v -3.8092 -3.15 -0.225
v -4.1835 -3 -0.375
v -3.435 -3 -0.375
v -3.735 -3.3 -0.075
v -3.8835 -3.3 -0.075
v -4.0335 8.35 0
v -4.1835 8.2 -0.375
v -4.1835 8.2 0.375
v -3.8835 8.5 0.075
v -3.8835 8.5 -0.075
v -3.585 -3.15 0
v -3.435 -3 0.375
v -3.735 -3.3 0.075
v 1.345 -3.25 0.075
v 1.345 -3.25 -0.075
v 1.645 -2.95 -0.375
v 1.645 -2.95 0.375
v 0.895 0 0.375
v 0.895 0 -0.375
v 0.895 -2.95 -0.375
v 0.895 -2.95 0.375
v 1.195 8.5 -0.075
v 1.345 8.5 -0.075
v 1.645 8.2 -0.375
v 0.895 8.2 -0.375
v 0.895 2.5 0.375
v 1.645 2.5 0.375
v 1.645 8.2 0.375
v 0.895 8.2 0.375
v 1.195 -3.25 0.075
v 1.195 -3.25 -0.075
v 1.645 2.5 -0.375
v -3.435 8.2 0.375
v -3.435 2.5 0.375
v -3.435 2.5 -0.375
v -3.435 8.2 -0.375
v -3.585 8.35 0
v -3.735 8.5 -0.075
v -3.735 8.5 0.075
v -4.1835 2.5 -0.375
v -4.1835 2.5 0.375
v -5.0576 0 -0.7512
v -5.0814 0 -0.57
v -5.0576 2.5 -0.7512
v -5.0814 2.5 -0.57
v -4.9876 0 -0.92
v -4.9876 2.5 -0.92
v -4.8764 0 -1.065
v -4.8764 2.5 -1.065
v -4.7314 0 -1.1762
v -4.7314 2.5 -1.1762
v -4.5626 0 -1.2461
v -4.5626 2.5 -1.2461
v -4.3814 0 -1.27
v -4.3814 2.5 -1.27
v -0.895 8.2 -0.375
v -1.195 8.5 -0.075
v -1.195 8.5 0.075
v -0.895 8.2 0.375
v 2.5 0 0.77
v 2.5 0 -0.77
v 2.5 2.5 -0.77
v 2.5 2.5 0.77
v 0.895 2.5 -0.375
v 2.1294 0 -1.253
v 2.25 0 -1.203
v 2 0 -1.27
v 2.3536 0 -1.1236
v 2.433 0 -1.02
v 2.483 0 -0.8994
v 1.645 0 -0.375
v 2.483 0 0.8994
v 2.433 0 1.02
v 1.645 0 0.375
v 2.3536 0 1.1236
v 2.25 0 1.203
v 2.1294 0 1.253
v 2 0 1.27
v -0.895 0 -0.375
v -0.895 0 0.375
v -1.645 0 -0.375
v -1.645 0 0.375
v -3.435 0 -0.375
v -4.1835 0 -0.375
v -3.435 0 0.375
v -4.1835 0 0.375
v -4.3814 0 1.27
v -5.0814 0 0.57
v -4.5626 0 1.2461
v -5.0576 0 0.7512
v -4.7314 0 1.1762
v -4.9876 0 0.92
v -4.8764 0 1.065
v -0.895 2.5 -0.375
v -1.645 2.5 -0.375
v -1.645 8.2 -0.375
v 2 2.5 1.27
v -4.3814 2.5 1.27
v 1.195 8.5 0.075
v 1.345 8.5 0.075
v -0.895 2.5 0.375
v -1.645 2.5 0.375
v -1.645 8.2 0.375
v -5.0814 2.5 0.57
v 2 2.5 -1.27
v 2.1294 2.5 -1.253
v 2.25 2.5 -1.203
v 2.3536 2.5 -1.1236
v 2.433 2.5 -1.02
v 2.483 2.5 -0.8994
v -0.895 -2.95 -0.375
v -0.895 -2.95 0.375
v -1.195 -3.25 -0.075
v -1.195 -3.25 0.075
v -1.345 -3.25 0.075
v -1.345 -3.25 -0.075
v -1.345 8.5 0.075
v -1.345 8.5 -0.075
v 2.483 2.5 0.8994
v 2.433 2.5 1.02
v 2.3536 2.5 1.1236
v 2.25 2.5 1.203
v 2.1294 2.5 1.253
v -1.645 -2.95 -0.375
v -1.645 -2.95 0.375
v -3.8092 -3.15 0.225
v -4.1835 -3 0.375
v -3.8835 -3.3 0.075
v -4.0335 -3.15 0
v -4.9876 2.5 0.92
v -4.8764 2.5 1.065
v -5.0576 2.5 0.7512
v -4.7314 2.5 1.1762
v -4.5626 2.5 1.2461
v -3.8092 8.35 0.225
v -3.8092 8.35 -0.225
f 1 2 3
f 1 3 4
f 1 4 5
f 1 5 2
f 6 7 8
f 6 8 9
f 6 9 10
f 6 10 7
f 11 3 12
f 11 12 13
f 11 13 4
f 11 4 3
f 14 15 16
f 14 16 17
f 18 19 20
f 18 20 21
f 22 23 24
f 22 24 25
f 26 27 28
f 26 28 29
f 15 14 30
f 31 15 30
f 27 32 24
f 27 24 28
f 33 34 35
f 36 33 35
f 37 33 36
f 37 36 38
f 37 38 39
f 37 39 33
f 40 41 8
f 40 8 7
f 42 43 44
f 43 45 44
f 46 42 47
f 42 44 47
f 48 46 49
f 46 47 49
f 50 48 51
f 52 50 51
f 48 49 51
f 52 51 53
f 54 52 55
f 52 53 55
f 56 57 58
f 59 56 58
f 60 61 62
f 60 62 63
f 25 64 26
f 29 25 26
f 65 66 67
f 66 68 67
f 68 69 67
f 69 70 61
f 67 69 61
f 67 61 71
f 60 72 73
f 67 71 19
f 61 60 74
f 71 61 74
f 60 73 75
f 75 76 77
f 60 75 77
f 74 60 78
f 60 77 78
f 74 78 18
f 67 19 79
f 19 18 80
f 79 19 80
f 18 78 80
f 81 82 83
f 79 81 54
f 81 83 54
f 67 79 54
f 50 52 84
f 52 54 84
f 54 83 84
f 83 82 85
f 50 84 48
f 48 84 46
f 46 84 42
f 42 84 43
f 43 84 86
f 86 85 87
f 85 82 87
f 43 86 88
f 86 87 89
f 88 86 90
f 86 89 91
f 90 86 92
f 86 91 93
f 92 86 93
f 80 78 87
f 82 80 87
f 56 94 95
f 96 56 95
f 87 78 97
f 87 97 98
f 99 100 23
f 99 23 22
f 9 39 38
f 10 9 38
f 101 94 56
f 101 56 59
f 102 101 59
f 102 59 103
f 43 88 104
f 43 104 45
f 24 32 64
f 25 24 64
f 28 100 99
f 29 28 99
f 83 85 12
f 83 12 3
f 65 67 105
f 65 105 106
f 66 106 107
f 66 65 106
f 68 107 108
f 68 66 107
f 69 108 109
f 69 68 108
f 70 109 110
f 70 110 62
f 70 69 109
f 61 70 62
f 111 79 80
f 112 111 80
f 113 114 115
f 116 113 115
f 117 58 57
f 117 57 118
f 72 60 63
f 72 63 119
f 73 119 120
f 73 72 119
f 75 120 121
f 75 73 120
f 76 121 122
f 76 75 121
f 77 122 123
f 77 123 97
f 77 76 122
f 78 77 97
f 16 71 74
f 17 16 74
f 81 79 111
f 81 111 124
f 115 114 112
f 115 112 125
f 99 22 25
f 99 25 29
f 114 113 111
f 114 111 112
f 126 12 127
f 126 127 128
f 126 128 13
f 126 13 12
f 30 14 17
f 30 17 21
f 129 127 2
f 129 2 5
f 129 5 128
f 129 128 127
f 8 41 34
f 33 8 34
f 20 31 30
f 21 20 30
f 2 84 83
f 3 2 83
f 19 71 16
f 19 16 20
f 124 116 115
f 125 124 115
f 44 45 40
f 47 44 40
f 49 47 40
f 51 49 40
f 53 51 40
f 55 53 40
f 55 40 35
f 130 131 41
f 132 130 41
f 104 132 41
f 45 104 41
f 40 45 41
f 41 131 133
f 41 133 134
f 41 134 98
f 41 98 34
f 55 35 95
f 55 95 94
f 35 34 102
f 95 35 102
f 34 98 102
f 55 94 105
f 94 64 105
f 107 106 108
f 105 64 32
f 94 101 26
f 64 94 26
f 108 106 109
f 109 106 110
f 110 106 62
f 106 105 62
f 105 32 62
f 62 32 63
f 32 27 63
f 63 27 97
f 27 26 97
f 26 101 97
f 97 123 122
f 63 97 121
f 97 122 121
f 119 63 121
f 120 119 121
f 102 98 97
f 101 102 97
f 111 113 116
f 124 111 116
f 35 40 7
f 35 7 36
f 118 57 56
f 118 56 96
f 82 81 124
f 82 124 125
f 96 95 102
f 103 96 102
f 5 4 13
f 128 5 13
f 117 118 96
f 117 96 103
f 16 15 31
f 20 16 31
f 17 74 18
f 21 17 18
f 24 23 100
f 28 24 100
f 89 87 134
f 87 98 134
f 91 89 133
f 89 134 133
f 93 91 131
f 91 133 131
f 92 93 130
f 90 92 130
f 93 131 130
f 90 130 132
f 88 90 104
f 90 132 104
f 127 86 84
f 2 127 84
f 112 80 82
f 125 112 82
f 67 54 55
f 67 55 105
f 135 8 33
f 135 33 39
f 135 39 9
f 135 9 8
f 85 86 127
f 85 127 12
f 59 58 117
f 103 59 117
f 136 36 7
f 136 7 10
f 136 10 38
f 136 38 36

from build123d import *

# Parameters (mm, degrees)
BOSS_EXTRUDE1_DEPTH          = 2.5
SKETCH2_W                    = 0.75
SKETCH2_H                    = 0.75
BOSS_EXTRUDE2_DEPTH          = 8.5
BOSS_EXTRUDE2_DEPTH_BACK     = 3.25
CHAMFER1_SIZE                = 0.3
REDONDEO3_R                  = 0.7
CROQUIS5_W                   = 0.748499393
CROQUIS5_H                   = 0.75
SALIENTE_EXTRUIR4_DEPTH      = 5.7
SALIENTE_EXTRUIR4_DEPTH_BACK = 5.5
CROQUIS6_W                   = 0.748499393
CROQUIS6_H                   = 0.75
SALIENTE_EXTRUIR5_DEPTH      = 0.3
SALIENTE_EXTRUIR5_TAPER      = 45
CROQUIS7_W                   = 0.748499393
CROQUIS7_H                   = 0.75
SALIENTE_EXTRUIR6_DEPTH      = 0.3
SALIENTE_EXTRUIR6_TAPER      = 45


with BuildPart() as part:
    # Sketch1 → Boss-Extrude1 (new body)
    with BuildSketch(Plane(origin=(0, 0, 0), x_dir=(-1, 0, 0), z_dir=(0, 1, 0))):
        with BuildLine():
            Line((-2, 1.27), (2, 1.27))
            Line((2, 1.27), (4.545175415, 1.27))
            Line((4.545175415, 1.27), (5.081429124, 1.27))
            Line((5.081429124, 1.27), (5.081429124, -1.27))
            Line((5.081429124, -1.27), (4.545175415, -1.27))
            Line((4.545175415, -1.27), (2, -1.27))
            Line((2, -1.27), (-2, -1.27))
            ThreePointArc((-2, -1.27), (-2.353553391, -1.123553391), (-2.5, -0.77))
            Line((-2.5, -0.77), (-2.5, 0.77))
            ThreePointArc((-2.5, 0.77), (-2.353553391, 1.123553391), (-2, 1.27))
        make_face()
    extrude(amount=BOSS_EXTRUDE1_DEPTH)

    # Sketch2 → Boss-Extrude2 (add, two sides)
    with BuildSketch(Plane(origin=(0, 0, 0), x_dir=(-1, 0, 0), z_dir=(0, 1, 0))) as boss_extrude2_sk:
        with Locations((1.27, 0)):
            Rectangle(SKETCH2_W, SKETCH2_H)
        with Locations((-1.27, 0)):
            Rectangle(SKETCH2_W, SKETCH2_H)
    extrude(amount=BOSS_EXTRUDE2_DEPTH)
    extrude(boss_extrude2_sk.sketch, amount=-BOSS_EXTRUDE2_DEPTH_BACK)

    # Chamfer1
    chamfer1_edges = [part.edges().sort_by_distance(p)[0] for p in [
        (-0.895, -3.25, 0),
        (-1.27, -3.25, 0.375),
        (-1.645, -3.25, 0),
        (-1.27, -3.25, -0.375),
        (-0.895, 8.5, 0),
        (-1.27, 8.5, -0.375),
        (-1.645, 8.5, 0),
        (-1.27, 8.5, 0.375),
        (0.895, -3.25, 0),
        (1.27, -3.25, -0.375),
        (1.645, -3.25, 0),
        (1.27, -3.25, 0.375),
        (0.895, 8.5, 0),
        (1.27, 8.5, 0.375),
        (1.645, 8.5, 0),
        (1.27, 8.5, -0.375),
    ]]
    chamfer(chamfer1_edges, length=CHAMFER1_SIZE)

    # Redondeo3
    redondeo3_edges = [part.edges().sort_by_distance(p)[0] for p in [
        (-5.081429124, 1.25, 1.27),
        (-5.081429124, 1.25, -1.27),
    ]]
    fillet(redondeo3_edges, radius=REDONDEO3_R)

    # Croquis5 → Saliente-Extruir4 (add, two sides)
    with BuildSketch(Plane(origin=(0, 2.5, 0), x_dir=(1, 0, 0), z_dir=(0, 1, 0))) as saliente_extruir4_sk:
        with Locations((-3.809249697, 0)):
            Rectangle(CROQUIS5_W, CROQUIS5_H)
    extrude(amount=SALIENTE_EXTRUIR4_DEPTH)
    extrude(saliente_extruir4_sk.sketch, amount=-SALIENTE_EXTRUIR4_DEPTH_BACK)

    # Croquis6 → Saliente-Extruir5 (add)
    with BuildSketch(Plane(origin=(0, 8.2, 0), x_dir=(1, 0, 0), z_dir=(0, 1, 0))):
        with Locations((-3.809249697, 0)):
            Rectangle(CROQUIS6_W, CROQUIS6_H)
    extrude(amount=SALIENTE_EXTRUIR5_DEPTH, taper=SALIENTE_EXTRUIR5_TAPER)

    # Croquis7 → Saliente-Extruir6 (add)
    with BuildSketch(Plane.XZ.offset(3)):
        with Locations((-3.809249697, 0)):
            Rectangle(CROQUIS7_W, CROQUIS7_H)
    extrude(amount=SALIENTE_EXTRUIR6_DEPTH, taper=SALIENTE_EXTRUIR6_TAPER)


solid = part.part
